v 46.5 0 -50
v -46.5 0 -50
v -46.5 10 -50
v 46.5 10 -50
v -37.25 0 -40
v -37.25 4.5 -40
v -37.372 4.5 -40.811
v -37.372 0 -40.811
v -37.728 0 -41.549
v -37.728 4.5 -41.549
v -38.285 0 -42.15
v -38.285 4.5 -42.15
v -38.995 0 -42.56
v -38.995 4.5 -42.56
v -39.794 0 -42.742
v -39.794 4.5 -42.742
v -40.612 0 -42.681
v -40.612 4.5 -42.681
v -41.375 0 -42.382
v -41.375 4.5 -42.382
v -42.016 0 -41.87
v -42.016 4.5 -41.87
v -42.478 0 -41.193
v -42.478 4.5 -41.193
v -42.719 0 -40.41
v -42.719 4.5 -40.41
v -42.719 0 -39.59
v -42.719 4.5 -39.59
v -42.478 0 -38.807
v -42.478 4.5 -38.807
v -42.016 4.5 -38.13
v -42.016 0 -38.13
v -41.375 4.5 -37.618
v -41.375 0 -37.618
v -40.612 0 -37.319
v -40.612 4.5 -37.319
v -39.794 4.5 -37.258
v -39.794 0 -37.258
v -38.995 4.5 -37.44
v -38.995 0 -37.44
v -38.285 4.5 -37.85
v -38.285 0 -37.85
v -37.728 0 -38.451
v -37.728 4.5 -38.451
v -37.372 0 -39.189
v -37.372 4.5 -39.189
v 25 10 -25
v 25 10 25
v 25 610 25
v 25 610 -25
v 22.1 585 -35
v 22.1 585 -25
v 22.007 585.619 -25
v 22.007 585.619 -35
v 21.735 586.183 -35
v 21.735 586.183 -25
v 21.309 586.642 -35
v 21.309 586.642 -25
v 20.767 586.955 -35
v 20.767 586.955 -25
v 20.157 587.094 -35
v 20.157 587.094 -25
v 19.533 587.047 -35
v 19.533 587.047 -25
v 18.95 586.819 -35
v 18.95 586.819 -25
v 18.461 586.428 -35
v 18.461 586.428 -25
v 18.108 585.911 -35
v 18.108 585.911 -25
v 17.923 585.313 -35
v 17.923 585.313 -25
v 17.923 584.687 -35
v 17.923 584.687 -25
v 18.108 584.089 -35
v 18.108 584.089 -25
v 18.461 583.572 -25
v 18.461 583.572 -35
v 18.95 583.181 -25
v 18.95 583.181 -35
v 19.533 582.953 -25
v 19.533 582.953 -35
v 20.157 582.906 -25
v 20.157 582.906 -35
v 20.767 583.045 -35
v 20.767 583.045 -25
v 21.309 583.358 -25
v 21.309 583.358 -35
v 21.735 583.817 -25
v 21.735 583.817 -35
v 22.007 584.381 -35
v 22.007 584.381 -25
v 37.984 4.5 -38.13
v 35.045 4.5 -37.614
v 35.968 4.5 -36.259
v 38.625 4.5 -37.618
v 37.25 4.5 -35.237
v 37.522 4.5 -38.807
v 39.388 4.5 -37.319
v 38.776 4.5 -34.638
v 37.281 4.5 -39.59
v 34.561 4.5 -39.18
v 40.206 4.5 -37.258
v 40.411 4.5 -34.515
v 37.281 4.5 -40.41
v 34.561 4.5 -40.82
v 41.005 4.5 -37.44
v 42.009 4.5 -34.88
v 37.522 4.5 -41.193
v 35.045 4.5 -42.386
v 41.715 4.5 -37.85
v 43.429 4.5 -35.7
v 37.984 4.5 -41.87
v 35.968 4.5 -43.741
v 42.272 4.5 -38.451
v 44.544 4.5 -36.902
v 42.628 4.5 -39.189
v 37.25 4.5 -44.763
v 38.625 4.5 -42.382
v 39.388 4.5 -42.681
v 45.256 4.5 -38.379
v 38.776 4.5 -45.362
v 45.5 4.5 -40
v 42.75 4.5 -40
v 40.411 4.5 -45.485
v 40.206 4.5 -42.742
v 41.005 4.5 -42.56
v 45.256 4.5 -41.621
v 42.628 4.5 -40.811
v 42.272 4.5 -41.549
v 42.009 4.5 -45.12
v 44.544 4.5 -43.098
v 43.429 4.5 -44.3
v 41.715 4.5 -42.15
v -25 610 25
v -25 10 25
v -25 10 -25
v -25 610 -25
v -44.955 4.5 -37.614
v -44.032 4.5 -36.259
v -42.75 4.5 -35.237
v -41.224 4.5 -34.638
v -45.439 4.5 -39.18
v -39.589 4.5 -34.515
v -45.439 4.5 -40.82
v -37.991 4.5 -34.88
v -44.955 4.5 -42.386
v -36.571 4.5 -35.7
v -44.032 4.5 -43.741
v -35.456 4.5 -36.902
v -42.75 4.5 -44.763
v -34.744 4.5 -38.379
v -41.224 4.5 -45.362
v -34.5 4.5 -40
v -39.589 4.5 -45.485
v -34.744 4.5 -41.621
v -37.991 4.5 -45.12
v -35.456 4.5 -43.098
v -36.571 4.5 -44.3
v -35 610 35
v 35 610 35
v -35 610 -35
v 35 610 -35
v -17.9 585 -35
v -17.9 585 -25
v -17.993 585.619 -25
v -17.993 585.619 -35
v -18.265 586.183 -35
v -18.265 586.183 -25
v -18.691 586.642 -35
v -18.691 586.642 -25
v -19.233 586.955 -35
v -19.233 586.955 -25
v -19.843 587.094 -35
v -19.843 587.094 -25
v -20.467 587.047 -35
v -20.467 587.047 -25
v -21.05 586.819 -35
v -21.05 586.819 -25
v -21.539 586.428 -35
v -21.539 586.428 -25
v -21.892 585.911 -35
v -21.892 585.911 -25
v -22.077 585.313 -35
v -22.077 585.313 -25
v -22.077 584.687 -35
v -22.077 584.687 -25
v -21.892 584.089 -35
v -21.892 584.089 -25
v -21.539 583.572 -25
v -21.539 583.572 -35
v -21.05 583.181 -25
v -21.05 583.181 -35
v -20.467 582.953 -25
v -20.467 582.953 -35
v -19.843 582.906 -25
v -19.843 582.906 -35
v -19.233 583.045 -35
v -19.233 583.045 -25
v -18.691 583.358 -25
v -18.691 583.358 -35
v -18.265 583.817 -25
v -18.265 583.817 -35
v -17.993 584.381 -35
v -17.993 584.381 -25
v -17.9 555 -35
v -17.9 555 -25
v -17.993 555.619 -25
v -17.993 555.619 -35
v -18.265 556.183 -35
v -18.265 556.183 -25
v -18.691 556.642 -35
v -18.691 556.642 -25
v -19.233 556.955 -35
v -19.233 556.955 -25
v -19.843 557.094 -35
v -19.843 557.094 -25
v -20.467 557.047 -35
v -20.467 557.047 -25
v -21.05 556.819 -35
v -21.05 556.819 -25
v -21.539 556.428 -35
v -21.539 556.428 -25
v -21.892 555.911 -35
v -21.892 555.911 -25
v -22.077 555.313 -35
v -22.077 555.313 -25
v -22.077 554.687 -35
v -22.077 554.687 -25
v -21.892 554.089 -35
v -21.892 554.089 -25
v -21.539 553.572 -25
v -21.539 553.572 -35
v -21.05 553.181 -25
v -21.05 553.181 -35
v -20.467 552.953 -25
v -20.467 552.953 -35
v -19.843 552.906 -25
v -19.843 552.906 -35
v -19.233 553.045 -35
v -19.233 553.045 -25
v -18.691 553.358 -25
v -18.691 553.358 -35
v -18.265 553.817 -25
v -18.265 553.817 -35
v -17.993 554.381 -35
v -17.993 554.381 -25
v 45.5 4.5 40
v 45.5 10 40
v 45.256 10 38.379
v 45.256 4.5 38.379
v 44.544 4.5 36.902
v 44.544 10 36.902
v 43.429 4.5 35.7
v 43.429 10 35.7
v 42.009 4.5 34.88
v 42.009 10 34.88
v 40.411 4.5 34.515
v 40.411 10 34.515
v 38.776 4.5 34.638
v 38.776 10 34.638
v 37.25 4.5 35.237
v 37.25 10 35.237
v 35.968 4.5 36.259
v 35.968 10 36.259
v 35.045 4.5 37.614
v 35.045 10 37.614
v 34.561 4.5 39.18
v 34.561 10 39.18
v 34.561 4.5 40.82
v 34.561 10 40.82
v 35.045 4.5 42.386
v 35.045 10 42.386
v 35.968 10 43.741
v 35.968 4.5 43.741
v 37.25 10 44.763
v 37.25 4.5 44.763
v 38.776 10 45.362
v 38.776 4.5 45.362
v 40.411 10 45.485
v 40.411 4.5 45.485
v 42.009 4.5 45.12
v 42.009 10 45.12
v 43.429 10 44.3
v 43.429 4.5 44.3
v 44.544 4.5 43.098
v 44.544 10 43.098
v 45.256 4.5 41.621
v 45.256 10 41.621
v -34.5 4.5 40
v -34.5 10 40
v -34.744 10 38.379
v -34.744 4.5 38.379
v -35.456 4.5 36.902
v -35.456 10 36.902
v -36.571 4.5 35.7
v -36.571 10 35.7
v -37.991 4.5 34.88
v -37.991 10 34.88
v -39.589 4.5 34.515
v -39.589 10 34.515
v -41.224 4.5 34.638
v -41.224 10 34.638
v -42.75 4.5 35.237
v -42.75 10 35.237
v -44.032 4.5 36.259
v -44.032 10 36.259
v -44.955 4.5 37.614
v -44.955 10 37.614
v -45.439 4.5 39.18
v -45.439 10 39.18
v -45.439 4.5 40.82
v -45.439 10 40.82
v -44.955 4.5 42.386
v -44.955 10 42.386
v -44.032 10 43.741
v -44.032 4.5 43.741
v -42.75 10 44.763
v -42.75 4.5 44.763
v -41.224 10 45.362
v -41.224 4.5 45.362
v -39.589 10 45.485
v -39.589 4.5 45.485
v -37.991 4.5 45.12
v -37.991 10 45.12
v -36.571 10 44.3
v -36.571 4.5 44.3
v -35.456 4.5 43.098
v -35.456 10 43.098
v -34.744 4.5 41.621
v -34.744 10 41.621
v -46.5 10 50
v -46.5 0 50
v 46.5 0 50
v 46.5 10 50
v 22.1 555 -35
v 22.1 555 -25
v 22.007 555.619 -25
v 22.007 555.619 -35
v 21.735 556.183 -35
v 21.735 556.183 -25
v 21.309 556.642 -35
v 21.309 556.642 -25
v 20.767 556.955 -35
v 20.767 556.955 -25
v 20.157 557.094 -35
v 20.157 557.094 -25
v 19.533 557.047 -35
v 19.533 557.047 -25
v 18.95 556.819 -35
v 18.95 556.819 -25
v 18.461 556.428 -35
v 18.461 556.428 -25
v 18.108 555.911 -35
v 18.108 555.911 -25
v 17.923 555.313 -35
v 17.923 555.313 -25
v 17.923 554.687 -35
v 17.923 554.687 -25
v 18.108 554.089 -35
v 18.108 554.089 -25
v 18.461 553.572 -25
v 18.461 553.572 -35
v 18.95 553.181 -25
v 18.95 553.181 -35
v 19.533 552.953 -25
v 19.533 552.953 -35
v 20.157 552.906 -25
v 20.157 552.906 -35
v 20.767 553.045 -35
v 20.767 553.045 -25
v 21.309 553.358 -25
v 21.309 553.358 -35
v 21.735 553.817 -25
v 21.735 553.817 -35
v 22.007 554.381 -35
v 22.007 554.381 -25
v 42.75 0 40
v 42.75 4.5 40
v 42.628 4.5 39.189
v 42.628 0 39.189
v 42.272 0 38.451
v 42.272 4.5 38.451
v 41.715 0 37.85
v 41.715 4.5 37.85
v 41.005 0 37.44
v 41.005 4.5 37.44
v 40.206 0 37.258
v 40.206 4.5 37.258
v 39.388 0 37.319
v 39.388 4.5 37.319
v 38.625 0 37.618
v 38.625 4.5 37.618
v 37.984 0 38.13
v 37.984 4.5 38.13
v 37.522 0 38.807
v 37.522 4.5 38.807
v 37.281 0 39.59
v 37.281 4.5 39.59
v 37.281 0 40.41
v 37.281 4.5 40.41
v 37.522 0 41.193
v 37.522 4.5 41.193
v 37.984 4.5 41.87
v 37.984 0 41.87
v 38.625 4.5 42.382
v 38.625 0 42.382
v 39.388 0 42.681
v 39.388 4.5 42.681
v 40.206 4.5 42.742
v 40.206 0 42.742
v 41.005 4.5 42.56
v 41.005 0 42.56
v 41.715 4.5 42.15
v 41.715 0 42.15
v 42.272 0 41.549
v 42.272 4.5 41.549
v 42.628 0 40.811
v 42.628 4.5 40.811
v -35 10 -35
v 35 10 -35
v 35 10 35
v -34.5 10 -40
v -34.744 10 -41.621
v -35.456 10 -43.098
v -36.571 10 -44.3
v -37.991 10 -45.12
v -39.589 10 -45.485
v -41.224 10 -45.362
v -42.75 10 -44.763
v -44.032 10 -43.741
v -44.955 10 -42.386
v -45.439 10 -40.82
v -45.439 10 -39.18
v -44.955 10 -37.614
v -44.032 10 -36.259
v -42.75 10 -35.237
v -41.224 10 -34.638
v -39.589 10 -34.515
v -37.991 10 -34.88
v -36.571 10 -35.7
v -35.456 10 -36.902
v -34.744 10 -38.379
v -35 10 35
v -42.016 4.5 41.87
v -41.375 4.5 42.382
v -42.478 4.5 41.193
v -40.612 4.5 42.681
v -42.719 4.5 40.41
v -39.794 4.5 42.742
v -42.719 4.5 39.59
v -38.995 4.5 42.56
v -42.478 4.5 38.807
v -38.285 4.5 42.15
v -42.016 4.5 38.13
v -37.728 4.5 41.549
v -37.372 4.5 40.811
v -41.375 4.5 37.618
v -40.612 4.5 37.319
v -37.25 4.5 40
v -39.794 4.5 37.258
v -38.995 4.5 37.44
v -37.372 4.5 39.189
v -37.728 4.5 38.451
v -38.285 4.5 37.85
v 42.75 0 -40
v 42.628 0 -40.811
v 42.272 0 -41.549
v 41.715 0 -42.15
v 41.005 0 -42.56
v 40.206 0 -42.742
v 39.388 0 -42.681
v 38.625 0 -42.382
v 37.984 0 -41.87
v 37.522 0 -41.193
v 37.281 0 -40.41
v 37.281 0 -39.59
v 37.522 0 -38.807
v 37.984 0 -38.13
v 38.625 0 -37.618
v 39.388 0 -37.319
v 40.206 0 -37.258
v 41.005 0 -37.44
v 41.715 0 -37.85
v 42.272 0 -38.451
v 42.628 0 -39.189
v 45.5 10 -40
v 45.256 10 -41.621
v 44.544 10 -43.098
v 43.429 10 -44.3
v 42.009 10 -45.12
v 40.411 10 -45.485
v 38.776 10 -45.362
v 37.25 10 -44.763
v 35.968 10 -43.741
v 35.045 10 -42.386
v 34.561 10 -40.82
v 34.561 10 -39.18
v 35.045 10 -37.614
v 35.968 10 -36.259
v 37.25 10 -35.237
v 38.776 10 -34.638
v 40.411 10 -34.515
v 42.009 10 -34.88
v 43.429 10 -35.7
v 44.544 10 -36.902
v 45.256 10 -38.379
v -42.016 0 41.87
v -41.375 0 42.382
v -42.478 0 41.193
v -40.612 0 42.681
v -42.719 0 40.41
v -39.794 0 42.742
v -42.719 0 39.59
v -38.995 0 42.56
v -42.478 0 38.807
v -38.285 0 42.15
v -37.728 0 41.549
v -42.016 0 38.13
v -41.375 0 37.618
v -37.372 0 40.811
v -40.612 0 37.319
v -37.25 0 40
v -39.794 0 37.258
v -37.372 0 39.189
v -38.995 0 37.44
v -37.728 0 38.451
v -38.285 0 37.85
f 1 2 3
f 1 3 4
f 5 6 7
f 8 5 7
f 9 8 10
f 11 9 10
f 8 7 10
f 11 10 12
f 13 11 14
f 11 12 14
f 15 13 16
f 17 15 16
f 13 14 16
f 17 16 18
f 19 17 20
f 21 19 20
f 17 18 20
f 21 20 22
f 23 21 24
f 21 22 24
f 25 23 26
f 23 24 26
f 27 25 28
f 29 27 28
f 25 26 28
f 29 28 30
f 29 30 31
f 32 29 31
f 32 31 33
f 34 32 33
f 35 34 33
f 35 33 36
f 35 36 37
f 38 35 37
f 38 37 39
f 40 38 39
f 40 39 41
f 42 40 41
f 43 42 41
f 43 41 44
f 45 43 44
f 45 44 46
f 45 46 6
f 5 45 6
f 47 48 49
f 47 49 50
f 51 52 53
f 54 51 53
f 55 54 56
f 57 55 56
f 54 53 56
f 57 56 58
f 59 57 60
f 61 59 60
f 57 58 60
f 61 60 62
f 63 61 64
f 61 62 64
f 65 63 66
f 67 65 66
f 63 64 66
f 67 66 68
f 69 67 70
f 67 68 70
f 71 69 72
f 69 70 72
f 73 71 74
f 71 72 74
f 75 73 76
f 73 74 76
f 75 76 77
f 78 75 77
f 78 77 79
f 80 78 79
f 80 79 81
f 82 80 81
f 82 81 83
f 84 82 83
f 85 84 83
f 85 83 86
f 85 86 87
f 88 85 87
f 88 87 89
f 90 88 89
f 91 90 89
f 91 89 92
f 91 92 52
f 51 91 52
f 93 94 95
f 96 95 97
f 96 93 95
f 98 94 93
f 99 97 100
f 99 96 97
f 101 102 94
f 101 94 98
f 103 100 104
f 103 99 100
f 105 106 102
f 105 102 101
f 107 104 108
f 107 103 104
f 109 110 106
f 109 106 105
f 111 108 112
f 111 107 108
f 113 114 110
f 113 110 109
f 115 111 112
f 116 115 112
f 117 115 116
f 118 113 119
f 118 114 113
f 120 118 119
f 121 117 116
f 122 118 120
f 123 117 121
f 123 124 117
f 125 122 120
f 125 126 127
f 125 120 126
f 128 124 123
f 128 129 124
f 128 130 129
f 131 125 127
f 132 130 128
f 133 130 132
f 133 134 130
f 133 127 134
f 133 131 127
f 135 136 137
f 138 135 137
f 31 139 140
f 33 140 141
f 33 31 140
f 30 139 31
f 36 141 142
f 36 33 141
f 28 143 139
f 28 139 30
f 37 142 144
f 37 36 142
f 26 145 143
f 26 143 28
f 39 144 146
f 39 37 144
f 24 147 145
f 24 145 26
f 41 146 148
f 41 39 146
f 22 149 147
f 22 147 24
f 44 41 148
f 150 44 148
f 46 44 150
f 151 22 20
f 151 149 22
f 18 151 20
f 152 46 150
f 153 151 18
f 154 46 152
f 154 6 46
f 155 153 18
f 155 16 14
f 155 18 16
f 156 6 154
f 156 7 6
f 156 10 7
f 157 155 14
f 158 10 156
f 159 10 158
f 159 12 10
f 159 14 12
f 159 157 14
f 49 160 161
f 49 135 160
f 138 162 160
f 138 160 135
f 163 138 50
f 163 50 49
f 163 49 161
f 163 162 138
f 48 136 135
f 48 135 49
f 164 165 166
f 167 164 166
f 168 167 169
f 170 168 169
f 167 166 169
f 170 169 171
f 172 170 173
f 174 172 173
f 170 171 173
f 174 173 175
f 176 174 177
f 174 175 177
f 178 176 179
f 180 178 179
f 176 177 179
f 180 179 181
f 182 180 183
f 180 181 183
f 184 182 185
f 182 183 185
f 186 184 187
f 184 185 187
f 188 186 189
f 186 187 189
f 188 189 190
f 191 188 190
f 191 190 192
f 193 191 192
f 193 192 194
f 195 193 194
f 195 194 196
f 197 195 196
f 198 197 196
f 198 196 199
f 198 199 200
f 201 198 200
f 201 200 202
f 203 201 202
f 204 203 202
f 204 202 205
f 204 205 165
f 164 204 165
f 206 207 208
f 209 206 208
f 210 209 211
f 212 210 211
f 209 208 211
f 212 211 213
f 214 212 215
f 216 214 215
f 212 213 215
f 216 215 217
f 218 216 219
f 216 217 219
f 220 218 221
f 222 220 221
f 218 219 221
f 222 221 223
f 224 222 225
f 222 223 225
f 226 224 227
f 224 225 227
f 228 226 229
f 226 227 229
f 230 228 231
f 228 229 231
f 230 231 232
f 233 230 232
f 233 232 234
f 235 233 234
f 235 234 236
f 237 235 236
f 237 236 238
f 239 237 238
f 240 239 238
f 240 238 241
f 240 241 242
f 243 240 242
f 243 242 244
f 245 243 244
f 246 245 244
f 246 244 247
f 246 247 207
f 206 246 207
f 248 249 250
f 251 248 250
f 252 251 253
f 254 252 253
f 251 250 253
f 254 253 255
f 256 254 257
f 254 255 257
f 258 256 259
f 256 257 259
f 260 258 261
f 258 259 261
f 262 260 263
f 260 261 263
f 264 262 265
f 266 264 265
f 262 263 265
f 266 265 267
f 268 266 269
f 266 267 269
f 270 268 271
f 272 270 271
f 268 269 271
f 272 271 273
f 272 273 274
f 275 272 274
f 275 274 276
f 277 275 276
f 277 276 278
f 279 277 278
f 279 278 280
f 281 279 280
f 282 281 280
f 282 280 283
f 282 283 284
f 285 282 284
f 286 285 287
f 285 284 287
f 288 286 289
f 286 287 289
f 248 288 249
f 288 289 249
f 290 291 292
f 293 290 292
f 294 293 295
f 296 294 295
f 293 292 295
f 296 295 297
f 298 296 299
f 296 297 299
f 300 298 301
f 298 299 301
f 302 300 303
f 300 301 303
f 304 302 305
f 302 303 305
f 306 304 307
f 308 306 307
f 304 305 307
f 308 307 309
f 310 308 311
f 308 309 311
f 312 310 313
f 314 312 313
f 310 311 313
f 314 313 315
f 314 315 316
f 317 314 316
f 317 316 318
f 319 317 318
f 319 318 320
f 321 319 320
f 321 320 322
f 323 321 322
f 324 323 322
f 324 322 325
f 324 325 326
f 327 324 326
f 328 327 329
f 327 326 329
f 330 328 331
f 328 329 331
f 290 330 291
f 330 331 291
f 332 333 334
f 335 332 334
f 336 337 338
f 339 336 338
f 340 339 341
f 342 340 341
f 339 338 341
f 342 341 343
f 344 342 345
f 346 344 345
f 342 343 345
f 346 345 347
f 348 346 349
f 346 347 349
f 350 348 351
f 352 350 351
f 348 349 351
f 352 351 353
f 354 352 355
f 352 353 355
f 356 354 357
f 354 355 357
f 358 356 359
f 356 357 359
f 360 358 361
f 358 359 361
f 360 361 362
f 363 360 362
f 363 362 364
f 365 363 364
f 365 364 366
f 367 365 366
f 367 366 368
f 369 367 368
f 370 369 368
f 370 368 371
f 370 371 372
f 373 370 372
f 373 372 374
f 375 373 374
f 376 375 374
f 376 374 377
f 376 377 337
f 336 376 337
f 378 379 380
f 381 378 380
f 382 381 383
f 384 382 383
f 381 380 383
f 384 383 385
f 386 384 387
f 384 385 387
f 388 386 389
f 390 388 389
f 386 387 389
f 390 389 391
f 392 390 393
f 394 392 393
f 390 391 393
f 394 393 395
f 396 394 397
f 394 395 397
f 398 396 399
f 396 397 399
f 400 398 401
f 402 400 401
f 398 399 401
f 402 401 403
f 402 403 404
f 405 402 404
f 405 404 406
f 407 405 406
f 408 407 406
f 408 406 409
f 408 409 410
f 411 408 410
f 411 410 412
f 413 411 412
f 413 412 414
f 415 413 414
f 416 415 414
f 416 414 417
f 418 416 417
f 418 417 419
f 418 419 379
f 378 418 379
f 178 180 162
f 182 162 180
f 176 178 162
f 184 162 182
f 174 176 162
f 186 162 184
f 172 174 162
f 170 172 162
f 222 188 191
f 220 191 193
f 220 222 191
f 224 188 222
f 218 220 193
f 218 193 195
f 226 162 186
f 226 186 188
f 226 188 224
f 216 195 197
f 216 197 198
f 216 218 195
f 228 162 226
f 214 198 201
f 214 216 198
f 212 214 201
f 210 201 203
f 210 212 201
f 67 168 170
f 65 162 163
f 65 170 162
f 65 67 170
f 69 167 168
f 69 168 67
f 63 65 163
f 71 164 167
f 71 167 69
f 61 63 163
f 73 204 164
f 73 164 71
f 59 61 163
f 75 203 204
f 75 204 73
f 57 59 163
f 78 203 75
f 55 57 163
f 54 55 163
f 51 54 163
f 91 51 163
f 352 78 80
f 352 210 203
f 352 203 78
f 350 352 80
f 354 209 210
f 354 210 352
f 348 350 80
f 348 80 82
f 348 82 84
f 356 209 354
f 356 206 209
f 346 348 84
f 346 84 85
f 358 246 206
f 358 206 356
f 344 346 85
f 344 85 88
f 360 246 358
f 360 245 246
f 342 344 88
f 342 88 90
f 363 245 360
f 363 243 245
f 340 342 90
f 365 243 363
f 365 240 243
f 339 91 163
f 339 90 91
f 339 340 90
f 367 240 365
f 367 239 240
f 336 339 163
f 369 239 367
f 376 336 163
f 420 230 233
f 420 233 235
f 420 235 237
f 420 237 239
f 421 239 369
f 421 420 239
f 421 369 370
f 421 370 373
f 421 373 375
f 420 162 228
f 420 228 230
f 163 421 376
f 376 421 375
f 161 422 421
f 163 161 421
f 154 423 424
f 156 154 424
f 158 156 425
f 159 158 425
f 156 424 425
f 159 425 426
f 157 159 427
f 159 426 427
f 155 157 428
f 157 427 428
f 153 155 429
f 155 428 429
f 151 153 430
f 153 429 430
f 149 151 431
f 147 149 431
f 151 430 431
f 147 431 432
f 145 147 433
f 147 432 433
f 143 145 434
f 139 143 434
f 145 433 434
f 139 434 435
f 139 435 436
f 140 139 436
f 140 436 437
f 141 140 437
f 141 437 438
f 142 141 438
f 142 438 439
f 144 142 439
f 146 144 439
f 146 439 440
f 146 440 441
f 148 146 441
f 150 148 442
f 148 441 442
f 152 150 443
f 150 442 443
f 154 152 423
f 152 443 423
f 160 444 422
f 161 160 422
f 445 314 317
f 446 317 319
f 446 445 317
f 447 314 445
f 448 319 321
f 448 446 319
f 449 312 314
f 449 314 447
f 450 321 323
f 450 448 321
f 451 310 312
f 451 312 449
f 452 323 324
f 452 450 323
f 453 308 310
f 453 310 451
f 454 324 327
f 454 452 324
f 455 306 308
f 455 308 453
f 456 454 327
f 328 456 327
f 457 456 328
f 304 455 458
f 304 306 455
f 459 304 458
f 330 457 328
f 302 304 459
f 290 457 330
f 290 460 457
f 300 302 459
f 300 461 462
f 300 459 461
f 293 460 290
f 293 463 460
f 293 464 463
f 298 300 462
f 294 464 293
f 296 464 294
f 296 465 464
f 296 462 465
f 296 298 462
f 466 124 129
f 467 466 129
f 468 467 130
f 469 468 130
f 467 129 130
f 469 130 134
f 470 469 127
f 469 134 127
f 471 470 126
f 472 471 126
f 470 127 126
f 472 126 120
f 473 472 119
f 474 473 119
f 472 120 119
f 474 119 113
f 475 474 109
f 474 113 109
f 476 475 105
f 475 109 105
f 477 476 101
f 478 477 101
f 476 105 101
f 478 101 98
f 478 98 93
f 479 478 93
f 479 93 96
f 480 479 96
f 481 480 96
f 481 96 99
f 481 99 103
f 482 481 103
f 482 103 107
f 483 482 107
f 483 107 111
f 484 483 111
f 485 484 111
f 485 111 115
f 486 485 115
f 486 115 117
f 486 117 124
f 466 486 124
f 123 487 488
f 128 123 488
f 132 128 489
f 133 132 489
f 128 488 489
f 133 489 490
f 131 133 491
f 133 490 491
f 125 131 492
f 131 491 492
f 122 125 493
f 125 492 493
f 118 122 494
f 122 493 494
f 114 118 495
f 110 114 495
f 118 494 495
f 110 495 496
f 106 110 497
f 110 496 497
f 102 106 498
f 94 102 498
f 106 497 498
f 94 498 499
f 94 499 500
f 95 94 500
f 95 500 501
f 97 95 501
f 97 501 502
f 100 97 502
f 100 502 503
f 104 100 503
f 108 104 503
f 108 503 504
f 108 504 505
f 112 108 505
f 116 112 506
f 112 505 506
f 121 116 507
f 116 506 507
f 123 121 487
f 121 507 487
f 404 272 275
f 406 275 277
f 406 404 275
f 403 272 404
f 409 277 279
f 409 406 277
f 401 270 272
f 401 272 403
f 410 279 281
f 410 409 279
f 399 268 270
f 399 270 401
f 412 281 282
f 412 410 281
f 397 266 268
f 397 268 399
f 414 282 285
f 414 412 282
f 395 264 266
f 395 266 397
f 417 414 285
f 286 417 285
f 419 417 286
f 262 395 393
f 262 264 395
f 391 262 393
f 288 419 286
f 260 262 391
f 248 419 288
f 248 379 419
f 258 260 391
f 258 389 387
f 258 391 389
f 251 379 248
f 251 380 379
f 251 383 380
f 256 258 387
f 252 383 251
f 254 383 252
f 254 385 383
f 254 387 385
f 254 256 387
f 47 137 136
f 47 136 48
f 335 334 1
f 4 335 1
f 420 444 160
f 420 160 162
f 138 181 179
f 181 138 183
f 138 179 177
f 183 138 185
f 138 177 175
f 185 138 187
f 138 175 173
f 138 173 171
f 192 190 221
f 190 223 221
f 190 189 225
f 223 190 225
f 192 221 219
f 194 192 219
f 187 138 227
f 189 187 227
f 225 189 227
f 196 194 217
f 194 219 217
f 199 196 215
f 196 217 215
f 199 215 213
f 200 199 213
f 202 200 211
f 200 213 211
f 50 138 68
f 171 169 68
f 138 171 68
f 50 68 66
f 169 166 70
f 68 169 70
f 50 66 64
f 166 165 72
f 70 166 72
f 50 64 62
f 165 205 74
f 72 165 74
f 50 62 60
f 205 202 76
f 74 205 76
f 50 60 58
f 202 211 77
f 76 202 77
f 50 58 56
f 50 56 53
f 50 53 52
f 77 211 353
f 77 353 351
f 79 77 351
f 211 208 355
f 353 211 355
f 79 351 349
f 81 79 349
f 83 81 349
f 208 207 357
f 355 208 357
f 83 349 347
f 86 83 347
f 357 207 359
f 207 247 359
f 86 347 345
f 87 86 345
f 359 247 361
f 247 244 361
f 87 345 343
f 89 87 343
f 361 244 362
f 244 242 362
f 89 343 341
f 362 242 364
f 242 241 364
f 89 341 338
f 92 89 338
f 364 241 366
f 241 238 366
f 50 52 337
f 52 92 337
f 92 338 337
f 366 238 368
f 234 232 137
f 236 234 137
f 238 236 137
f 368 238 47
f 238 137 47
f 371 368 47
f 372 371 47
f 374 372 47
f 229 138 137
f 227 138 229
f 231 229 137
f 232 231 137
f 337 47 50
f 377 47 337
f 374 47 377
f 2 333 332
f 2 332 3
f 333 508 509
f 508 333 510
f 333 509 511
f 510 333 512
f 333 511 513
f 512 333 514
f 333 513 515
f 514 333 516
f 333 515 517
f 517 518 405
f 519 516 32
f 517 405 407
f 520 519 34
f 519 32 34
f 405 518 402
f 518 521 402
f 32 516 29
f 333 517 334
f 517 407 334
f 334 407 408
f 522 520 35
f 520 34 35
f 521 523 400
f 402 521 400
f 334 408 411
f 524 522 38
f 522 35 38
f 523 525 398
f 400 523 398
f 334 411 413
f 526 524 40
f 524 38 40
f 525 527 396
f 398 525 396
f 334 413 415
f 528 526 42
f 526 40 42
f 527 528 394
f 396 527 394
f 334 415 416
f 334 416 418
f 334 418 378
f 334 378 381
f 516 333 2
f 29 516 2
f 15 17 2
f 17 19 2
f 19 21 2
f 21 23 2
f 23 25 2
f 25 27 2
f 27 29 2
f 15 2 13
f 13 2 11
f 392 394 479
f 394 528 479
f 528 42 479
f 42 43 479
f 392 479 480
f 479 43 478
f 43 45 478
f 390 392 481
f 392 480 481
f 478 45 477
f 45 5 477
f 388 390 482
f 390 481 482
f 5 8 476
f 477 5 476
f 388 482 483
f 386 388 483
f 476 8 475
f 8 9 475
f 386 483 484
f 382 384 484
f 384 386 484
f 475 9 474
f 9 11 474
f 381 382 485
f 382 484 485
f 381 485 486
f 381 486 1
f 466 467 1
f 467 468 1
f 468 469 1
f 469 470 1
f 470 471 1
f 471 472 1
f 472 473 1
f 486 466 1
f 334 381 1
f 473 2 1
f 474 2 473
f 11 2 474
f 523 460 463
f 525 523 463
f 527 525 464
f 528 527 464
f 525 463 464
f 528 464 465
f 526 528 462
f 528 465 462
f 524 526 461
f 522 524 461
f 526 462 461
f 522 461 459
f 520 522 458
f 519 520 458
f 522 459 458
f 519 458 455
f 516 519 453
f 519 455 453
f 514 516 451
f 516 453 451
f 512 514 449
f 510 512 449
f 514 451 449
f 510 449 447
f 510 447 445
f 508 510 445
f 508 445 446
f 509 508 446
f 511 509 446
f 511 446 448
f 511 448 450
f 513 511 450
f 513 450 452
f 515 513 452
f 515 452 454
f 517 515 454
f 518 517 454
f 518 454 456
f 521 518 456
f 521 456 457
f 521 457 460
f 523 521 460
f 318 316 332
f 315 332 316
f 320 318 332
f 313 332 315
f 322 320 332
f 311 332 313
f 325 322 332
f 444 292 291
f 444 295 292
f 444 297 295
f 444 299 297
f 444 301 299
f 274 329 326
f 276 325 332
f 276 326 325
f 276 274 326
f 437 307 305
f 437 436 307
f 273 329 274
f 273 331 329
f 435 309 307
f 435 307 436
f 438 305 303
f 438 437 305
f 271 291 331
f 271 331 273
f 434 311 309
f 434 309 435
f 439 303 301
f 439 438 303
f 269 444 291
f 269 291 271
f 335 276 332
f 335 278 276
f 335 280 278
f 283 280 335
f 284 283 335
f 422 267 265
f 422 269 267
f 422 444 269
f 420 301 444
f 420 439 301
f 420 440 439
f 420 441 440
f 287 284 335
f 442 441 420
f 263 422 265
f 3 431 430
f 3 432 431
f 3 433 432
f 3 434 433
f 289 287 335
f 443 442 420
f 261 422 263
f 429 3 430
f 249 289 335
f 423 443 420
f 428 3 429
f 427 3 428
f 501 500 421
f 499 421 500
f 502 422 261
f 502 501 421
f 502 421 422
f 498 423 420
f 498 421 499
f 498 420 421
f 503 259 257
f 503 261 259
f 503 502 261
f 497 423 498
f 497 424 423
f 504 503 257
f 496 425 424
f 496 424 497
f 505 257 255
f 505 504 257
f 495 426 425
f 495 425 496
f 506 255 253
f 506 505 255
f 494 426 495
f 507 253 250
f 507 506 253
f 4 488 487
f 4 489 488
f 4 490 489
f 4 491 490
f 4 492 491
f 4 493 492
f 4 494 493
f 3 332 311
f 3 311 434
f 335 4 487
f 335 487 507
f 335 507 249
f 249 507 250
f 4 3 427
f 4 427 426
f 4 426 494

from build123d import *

# Parameters (mm, degrees)
SKETCH1_W             = 93
SKETCH1_H             = 100
BOSS_EXTRUDE1_DEPTH   = 10
SKETCH7_W             = 70
SKETCH7_H             = 70
SKETCH7_W_2           = 50
SKETCH7_H_2           = 50
BOSS_EXTRUDE4_DEPTH   = 600
M5_TAPPED_HOLE1_D     = 4.2
M5_TAPPED_HOLE1_DEPTH = 12.4
M5_TAPPED_HOLE1_TIP   = 1.2618073
SKETCH11_R            = 2.75
CUT_EXTRUDE1_DEPTH    = 11
SKETCH12_R            = 5.5
CUT_EXTRUDE2_DEPTH    = 5.5


with BuildPart() as part:
    # Sketch1 → Boss-Extrude1 (new body)
    with BuildSketch(Plane(origin=(0, 0, 0), x_dir=(1, 0, 0), z_dir=(0, 1, 0))):
        Rectangle(SKETCH1_W, SKETCH1_H)
    extrude(amount=BOSS_EXTRUDE1_DEPTH)

    # Sketch7 → Boss-Extrude4 (add)
    with BuildSketch(Plane(origin=(0, 10, 0), x_dir=(1, 0, 0), z_dir=(0, 1, 0))):
        Rectangle(SKETCH7_W, SKETCH7_H)
        Rectangle(SKETCH7_W_2, SKETCH7_H_2, mode=Mode.SUBTRACT)
    extrude(amount=BOSS_EXTRUDE4_DEPTH)

    # M5 Tapped Hole1
    with Locations(Plane(origin=(0, 0, -35), x_dir=(-1, 0, 0), z_dir=(0, 0, -1))):
        with Locations((-20, 585), (20, 585), (20, 555), (-20, 555)):
            Hole(M5_TAPPED_HOLE1_D / 2, depth=M5_TAPPED_HOLE1_DEPTH)
            with Locations((0, 0, -(M5_TAPPED_HOLE1_DEPTH + M5_TAPPED_HOLE1_TIP / 2))):  # 118° drill point
                Cone(0, M5_TAPPED_HOLE1_D / 2, M5_TAPPED_HOLE1_TIP, mode=Mode.SUBTRACT)

    # Sketch11 → Cut-Extrude1 (cut, through all)
    with BuildSketch(Plane(origin=(0, 10, 0), x_dir=(1, 0, 0), z_dir=(0, 1, 0))):
        with Locations((-40, 40)):
            Circle(SKETCH11_R)
        with Locations((-40, -40)):
            Circle(SKETCH11_R)
        with Locations((40, -40)):
            Circle(SKETCH11_R)
        with Locations((40, 40)):
            Circle(SKETCH11_R)
    extrude(amount=-CUT_EXTRUDE1_DEPTH, mode=Mode.SUBTRACT)

    # Sketch12 → Cut-Extrude2 (cut)
    with BuildSketch(Plane(origin=(0, 10, 0), x_dir=(1, 0, 0), z_dir=(0, 1, 0))):
        with Locations((-40, 40)):
            Circle(SKETCH12_R)
        with Locations((40, 40)):
            Circle(SKETCH12_R)
        with Locations((40, -40)):
            Circle(SKETCH12_R)
        with Locations((-40, -40)):
            Circle(SKETCH12_R)
    extrude(amount=-CUT_EXTRUDE2_DEPTH, mode=Mode.SUBTRACT)


solid = part.part
